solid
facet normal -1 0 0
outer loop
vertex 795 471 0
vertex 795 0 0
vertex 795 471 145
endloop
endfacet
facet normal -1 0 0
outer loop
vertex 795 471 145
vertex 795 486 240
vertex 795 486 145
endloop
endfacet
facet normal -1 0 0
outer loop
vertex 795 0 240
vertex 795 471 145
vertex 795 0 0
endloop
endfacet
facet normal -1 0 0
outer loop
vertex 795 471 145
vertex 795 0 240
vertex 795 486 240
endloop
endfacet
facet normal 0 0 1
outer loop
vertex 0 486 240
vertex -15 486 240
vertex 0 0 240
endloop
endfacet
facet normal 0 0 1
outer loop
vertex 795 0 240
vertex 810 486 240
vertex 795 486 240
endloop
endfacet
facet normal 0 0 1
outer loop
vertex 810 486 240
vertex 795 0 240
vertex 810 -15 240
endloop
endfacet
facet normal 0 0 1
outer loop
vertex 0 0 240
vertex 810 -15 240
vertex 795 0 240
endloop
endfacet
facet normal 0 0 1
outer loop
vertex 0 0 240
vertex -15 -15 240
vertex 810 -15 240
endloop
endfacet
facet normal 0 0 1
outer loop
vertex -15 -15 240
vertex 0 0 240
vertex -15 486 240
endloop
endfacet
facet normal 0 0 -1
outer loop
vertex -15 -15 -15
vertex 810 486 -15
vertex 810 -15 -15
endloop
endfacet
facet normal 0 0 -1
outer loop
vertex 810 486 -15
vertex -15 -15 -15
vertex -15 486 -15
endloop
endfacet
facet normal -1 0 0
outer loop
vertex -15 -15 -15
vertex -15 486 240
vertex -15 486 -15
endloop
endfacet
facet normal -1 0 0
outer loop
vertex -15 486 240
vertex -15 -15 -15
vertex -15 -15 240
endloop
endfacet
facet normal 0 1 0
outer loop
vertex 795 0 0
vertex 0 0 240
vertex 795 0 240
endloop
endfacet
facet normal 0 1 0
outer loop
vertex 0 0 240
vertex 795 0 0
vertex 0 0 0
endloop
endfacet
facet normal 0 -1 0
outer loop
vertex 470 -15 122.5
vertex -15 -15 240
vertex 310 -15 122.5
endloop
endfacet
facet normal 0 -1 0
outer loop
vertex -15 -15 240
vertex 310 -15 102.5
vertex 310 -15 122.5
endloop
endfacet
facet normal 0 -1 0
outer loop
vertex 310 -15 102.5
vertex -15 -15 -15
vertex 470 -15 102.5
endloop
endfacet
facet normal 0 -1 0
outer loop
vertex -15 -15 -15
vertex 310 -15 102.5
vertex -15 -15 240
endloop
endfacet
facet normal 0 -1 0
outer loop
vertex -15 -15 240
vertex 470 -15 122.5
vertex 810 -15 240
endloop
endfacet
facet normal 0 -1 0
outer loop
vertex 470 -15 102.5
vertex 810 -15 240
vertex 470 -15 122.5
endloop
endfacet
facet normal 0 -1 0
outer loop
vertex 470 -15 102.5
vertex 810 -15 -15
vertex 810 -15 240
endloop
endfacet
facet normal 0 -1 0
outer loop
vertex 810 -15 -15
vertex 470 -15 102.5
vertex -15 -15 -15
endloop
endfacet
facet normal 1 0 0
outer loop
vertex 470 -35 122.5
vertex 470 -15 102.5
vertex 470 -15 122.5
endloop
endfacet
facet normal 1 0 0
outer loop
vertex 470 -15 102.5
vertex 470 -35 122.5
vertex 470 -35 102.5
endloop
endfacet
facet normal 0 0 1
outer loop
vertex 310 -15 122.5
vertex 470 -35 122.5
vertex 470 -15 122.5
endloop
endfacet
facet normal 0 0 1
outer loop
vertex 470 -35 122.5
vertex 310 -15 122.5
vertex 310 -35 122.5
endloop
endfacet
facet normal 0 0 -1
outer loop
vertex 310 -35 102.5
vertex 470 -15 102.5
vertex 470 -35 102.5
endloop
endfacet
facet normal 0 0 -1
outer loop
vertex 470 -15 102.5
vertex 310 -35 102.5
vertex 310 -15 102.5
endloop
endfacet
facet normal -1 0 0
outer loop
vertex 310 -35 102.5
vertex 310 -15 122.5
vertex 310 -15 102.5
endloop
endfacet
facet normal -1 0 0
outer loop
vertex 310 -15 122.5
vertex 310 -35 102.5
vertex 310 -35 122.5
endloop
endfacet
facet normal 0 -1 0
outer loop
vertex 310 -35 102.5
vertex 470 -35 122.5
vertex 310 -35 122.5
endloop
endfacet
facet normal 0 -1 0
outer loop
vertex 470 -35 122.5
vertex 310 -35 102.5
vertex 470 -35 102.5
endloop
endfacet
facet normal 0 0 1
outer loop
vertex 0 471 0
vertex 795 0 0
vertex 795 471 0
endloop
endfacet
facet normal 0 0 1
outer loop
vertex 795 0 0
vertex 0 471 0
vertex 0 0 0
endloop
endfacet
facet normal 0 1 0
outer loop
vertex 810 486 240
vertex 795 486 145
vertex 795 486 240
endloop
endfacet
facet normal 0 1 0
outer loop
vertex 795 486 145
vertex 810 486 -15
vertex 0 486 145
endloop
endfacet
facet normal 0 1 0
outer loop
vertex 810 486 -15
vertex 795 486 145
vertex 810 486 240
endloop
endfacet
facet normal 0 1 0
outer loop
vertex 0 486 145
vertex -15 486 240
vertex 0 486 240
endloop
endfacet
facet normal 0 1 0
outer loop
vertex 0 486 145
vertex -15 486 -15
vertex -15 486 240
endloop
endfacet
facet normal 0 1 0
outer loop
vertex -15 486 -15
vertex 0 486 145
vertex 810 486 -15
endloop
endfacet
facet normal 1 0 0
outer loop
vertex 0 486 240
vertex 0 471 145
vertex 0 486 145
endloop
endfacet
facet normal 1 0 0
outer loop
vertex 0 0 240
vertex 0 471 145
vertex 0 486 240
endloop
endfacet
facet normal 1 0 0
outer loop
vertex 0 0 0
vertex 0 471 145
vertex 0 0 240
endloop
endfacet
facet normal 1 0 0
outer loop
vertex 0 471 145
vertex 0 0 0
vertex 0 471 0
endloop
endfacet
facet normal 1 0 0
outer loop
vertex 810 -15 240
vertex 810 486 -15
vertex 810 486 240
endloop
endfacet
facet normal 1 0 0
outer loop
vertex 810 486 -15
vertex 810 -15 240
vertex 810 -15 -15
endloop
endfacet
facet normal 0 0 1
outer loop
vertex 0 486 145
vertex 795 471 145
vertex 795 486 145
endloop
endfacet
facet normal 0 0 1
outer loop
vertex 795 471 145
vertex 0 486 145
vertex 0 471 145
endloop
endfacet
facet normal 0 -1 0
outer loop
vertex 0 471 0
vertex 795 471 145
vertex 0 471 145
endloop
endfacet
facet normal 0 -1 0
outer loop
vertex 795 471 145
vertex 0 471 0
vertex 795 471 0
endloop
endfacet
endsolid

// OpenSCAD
// These are the usable inner dimension of the drawer.
function drawer_inner_depth() = 471; // millimeters
function drawer_inner_width() = 780;
function drawer_inner_front_height() = 255;
function drawer_inner_back_height() = 160;
function drawer_inner_height() = max(drawer_inner_front_height(), drawer_inner_back_height());

function drawer_side_wall_thickness() = 15; // Does not matter in regards to usable space

module drawer_bottom() {
    width = drawer_inner_width() + 2* drawer_side_wall_thickness();
    height = drawer_side_wall_thickness();
    depth = drawer_inner_depth() + 2* drawer_side_wall_thickness();

    // make the innner space of the drawer aligned with coordinates [0,0,0]
    offset_x = -drawer_side_wall_thickness();
    offset_y = -drawer_side_wall_thickness();
    offset_z = -drawer_side_wall_thickness();

    translate([offset_x, offset_y, offset_z]) cube([width, depth, height]);
}

module drawer_front() {
    width = drawer_inner_width() + 2* drawer_side_wall_thickness();
    height = drawer_inner_height();
    depth = drawer_side_wall_thickness();

    offset_x = -drawer_side_wall_thickness();
    offset_y = -drawer_side_wall_thickness();
    offset_z = -drawer_side_wall_thickness();

    handle_width = 160;
    handle_depth = 20;
    handle_height = 20;

    // make the innner space of the drawer aligned with coordinates [0,0,0]
    handle_offset_x = offset_x + width / 2 - handle_width / 2;
    handle_offset_y = offset_y - handle_depth;
    handle_offset_z = offset_z + height / 2 - handle_height / 2;

    union() {
        // front panel
        translate([offset_x, offset_y, offset_z]) cube([width, depth, height]);
        translate([handle_offset_x, handle_offset_y, handle_offset_z]) {
            cube([handle_width, handle_depth, handle_height]);
        }
    }
}

module drawer_side(s = "left") {
    width = drawer_side_wall_thickness();
    height = drawer_inner_height();
    depth = drawer_inner_depth() + 2* drawer_side_wall_thickness();

    offset_y = -drawer_side_wall_thickness();
    offset_z = -drawer_side_wall_thickness();
    if (s == "right") {
        offset_x = drawer_inner_width() + drawer_side_wall_thickness();
        translate([offset_x, offset_y, offset_z]) cube([width, depth, height]);
    } else {
        offset_x = -drawer_side_wall_thickness();
        translate([offset_x, offset_y, offset_z]) cube([width, depth, height]);
    }
}

module drawer_back() {
    width = drawer_inner_width() + 2* drawer_side_wall_thickness();
    height = drawer_inner_back_height();
    depth = drawer_side_wall_thickness();

    offset_x = -drawer_side_wall_thickness();
    offset_y = drawer_inner_depth();
    offset_z = -drawer_side_wall_thickness();

    translate([offset_x, offset_y, offset_z]) cube([width, depth, height]);
}

module drawer() {
    union() {
        drawer_bottom();
        drawer_front();
        drawer_side(s = "left");
        drawer_side(s = "right");
        drawer_back();
    }
}

drawer();
